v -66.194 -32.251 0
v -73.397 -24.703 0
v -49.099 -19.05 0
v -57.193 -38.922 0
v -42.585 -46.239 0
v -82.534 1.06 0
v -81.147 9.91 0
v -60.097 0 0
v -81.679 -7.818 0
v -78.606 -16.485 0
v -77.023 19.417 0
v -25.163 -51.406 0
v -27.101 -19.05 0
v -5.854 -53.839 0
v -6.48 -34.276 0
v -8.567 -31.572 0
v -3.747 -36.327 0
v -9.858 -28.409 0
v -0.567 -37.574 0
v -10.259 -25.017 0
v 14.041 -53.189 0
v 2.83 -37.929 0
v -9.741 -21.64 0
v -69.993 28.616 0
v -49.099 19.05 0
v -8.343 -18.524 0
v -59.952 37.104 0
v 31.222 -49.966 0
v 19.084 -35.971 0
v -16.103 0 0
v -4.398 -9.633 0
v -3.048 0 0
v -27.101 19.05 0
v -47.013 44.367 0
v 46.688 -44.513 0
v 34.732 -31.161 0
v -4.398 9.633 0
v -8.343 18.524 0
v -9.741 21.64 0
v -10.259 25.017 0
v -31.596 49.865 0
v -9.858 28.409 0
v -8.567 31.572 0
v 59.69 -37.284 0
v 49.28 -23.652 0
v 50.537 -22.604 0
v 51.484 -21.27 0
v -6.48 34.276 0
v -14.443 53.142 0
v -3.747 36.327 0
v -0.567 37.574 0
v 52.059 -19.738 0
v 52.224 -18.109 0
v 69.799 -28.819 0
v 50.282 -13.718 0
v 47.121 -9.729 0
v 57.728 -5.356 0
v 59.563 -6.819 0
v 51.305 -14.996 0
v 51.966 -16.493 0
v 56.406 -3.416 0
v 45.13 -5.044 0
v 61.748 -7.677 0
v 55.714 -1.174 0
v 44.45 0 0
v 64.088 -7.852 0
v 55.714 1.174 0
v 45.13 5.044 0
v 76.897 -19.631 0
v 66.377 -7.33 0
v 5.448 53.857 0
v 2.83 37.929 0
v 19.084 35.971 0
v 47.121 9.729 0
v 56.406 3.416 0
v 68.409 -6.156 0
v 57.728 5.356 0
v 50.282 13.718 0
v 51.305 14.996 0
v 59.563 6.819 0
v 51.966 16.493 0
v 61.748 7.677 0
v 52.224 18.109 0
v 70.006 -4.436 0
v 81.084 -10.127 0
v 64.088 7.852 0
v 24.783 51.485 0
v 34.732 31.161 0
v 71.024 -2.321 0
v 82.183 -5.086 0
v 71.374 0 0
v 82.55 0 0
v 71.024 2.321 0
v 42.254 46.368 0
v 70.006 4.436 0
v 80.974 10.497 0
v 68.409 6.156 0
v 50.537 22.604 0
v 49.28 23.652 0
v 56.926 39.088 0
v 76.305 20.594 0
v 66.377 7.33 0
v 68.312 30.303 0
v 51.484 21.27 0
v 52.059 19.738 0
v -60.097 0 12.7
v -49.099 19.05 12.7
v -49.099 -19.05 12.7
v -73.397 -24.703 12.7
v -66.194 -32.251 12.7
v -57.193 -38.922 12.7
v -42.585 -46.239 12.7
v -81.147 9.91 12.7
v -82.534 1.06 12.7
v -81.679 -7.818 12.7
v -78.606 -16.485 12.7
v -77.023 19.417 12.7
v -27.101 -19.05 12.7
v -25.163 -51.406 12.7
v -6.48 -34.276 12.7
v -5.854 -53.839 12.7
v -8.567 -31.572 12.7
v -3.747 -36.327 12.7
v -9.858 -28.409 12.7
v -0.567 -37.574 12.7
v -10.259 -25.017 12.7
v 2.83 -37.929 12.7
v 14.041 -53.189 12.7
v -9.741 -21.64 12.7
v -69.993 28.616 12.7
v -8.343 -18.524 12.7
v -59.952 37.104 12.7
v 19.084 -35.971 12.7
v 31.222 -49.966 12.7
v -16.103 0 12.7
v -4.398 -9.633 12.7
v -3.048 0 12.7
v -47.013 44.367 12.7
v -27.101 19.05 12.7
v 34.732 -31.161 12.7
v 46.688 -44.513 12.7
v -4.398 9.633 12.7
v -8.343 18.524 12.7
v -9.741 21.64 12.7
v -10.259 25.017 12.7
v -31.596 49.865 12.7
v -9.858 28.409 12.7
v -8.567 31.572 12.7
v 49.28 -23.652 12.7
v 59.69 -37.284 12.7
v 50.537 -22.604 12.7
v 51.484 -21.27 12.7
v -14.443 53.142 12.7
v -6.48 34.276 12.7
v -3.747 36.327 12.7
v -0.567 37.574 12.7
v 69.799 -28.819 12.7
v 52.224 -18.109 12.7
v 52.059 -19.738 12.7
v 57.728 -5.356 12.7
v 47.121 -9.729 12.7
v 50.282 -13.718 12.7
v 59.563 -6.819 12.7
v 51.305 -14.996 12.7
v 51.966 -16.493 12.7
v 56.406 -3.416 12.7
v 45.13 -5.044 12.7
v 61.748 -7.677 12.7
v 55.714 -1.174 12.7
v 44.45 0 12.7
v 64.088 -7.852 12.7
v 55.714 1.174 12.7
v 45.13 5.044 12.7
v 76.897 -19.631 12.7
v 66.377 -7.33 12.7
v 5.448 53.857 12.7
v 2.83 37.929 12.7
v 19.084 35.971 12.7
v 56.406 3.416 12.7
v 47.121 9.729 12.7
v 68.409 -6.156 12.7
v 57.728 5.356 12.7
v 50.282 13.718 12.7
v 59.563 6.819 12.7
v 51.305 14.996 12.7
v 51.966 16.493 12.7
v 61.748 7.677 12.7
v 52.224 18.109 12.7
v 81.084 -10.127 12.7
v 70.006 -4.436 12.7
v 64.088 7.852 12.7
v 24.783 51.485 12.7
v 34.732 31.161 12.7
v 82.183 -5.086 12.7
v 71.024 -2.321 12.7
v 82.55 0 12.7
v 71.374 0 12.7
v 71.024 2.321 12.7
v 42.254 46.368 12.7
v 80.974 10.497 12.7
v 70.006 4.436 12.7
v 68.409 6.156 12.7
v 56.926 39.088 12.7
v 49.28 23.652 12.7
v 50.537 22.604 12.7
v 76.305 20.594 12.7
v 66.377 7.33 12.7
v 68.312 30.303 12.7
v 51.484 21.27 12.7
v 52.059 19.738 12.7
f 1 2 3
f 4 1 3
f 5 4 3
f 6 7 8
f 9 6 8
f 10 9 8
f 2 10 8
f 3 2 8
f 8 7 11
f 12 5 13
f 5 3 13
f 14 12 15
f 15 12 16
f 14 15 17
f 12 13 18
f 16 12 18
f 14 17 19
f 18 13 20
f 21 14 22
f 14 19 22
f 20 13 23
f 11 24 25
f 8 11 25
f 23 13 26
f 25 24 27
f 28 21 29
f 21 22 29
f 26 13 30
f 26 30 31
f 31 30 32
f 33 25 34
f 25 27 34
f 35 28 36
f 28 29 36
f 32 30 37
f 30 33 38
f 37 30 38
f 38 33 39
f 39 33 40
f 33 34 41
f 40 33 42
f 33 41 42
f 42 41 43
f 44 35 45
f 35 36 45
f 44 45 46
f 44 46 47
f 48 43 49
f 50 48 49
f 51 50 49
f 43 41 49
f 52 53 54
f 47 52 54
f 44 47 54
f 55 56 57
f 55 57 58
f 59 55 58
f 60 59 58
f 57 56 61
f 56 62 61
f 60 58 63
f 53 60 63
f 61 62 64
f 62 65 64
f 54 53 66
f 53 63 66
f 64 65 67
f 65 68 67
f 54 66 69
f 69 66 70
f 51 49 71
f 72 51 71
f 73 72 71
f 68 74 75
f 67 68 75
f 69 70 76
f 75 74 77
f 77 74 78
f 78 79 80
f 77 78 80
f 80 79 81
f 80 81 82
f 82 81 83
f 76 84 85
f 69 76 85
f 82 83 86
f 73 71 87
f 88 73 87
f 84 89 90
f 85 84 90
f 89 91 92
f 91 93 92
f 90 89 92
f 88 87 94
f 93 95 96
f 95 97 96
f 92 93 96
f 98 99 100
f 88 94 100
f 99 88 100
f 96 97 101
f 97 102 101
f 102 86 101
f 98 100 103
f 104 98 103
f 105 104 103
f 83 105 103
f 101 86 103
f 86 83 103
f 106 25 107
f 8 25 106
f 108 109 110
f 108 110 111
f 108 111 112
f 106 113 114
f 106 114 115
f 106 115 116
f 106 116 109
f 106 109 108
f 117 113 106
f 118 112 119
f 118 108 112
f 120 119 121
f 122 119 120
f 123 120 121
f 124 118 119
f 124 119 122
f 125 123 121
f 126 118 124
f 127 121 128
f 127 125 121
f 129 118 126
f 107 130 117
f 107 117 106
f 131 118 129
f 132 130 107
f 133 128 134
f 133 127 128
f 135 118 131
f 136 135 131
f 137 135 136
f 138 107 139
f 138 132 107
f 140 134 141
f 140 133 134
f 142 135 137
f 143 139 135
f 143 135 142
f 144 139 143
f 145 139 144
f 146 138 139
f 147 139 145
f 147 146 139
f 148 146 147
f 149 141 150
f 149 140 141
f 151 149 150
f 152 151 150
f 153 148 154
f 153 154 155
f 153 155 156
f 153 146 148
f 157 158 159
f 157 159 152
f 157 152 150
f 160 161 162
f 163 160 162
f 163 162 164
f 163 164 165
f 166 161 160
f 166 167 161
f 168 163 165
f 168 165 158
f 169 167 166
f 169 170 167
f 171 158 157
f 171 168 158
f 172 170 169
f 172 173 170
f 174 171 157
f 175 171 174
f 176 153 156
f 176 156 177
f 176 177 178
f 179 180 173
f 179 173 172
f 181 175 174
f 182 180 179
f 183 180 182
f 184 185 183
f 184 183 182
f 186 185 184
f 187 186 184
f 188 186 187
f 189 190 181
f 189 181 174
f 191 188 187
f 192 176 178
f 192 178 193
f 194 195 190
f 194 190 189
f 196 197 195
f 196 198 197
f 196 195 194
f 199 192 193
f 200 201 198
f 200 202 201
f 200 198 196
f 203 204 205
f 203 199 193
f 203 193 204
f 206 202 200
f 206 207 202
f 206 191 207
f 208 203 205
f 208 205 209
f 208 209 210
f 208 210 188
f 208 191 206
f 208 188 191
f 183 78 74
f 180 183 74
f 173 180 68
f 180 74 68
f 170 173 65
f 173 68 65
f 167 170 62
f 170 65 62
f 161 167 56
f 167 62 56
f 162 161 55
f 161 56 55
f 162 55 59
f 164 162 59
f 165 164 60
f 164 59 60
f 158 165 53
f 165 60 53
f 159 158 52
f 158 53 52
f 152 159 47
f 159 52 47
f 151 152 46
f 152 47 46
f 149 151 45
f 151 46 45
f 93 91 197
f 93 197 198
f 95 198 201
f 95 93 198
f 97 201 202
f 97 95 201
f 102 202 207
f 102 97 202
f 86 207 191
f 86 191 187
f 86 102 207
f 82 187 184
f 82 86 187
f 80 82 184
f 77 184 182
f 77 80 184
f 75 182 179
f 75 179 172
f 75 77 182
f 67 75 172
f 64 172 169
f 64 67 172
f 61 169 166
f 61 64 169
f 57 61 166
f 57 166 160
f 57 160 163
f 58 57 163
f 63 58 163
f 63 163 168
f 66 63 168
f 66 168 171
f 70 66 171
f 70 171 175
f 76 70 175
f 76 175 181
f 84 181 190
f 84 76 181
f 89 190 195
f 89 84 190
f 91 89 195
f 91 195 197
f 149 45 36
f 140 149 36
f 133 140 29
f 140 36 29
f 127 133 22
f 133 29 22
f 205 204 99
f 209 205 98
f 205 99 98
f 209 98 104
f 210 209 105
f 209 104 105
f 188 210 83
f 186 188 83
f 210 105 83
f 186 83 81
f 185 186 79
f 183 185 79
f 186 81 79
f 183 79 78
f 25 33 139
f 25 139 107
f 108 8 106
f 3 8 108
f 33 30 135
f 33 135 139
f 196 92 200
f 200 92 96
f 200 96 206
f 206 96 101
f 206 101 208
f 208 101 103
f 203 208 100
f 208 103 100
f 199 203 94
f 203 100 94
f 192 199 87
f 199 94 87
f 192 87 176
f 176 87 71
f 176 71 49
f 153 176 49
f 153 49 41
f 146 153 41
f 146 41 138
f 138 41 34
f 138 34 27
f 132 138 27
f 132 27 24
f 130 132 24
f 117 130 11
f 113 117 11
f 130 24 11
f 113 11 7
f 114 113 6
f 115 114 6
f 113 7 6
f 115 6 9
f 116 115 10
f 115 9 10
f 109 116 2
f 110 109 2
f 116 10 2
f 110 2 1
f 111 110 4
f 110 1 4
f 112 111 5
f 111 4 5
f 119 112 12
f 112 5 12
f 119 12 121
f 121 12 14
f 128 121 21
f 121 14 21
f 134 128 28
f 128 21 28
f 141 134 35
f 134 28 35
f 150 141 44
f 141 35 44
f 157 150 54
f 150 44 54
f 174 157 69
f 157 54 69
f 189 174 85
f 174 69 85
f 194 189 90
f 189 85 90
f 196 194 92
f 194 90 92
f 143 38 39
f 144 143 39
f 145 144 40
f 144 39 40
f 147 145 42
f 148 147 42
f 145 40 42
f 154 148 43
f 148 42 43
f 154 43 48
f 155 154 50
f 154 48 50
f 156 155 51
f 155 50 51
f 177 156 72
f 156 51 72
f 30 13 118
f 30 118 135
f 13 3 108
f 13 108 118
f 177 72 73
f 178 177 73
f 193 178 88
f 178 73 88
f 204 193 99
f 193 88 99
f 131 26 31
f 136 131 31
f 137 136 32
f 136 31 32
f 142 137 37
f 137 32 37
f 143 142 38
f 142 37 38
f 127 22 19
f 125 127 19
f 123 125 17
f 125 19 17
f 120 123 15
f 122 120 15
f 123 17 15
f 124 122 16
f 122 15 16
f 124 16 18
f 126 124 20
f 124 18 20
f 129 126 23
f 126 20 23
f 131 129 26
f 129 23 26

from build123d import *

# Parameters (mm, degrees)
SKETCH1_RX          = 82.55
SKETCH1_RY          = 53.975
SKETCH1_R           = 7.874
BOSS_EXTRUDE1_DEPTH = 12.7


with BuildPart() as part:
    # Sketch1 → Boss-Extrude1 (new body)
    with BuildSketch(Plane.XY):
        with Locations((0, 0)):
            Ellipse(SKETCH1_RX, SKETCH1_RY)
        with Locations((63.5, 0)):
            Circle(SKETCH1_R, mode=Mode.SUBTRACT)
        Polygon((-16.102954744, 0), (-27.101477372, 19.05), (-49.098522628, 19.05), (-60.097045256, 0), (-49.098522628, -19.05), (-27.101477372, -19.05), align=None, mode=Mode.SUBTRACT)
        with BuildLine():
            ThreePointArc((50.282192855, 13.718311641), (44.45, 0), (50.282192855, -13.718311641))
            ThreePointArc((50.282192855, -13.718311641), (52.194156422, -18.928772289), (49.279540311, -23.652067514))
            ThreePointArc((49.279540311, -23.652067514), (27.015068096, -33.914821935), (2.830078432, -37.92943602))
            ThreePointArc((2.830078432, -37.92943602), (-8.566993644, -31.572176432), (-8.342514151, -18.523896457))
            ThreePointArc((-8.342514151, -18.523896457), (-3.048, 0), (-8.342514151, 18.523896457))
            ThreePointArc((-8.342514151, 18.523896457), (-8.566993644, 31.572176432), (2.830078432, 37.92943602))
            ThreePointArc((2.830078432, 37.92943602), (27.015068096, 33.914821935), (49.279540311, 23.652067514))
            ThreePointArc((49.279540311, 23.652067514), (52.194156422, 18.928772289), (50.282192855, 13.718311641))
        make_face(mode=Mode.SUBTRACT)
    extrude(amount=BOSS_EXTRUDE1_DEPTH)


solid = part.part
